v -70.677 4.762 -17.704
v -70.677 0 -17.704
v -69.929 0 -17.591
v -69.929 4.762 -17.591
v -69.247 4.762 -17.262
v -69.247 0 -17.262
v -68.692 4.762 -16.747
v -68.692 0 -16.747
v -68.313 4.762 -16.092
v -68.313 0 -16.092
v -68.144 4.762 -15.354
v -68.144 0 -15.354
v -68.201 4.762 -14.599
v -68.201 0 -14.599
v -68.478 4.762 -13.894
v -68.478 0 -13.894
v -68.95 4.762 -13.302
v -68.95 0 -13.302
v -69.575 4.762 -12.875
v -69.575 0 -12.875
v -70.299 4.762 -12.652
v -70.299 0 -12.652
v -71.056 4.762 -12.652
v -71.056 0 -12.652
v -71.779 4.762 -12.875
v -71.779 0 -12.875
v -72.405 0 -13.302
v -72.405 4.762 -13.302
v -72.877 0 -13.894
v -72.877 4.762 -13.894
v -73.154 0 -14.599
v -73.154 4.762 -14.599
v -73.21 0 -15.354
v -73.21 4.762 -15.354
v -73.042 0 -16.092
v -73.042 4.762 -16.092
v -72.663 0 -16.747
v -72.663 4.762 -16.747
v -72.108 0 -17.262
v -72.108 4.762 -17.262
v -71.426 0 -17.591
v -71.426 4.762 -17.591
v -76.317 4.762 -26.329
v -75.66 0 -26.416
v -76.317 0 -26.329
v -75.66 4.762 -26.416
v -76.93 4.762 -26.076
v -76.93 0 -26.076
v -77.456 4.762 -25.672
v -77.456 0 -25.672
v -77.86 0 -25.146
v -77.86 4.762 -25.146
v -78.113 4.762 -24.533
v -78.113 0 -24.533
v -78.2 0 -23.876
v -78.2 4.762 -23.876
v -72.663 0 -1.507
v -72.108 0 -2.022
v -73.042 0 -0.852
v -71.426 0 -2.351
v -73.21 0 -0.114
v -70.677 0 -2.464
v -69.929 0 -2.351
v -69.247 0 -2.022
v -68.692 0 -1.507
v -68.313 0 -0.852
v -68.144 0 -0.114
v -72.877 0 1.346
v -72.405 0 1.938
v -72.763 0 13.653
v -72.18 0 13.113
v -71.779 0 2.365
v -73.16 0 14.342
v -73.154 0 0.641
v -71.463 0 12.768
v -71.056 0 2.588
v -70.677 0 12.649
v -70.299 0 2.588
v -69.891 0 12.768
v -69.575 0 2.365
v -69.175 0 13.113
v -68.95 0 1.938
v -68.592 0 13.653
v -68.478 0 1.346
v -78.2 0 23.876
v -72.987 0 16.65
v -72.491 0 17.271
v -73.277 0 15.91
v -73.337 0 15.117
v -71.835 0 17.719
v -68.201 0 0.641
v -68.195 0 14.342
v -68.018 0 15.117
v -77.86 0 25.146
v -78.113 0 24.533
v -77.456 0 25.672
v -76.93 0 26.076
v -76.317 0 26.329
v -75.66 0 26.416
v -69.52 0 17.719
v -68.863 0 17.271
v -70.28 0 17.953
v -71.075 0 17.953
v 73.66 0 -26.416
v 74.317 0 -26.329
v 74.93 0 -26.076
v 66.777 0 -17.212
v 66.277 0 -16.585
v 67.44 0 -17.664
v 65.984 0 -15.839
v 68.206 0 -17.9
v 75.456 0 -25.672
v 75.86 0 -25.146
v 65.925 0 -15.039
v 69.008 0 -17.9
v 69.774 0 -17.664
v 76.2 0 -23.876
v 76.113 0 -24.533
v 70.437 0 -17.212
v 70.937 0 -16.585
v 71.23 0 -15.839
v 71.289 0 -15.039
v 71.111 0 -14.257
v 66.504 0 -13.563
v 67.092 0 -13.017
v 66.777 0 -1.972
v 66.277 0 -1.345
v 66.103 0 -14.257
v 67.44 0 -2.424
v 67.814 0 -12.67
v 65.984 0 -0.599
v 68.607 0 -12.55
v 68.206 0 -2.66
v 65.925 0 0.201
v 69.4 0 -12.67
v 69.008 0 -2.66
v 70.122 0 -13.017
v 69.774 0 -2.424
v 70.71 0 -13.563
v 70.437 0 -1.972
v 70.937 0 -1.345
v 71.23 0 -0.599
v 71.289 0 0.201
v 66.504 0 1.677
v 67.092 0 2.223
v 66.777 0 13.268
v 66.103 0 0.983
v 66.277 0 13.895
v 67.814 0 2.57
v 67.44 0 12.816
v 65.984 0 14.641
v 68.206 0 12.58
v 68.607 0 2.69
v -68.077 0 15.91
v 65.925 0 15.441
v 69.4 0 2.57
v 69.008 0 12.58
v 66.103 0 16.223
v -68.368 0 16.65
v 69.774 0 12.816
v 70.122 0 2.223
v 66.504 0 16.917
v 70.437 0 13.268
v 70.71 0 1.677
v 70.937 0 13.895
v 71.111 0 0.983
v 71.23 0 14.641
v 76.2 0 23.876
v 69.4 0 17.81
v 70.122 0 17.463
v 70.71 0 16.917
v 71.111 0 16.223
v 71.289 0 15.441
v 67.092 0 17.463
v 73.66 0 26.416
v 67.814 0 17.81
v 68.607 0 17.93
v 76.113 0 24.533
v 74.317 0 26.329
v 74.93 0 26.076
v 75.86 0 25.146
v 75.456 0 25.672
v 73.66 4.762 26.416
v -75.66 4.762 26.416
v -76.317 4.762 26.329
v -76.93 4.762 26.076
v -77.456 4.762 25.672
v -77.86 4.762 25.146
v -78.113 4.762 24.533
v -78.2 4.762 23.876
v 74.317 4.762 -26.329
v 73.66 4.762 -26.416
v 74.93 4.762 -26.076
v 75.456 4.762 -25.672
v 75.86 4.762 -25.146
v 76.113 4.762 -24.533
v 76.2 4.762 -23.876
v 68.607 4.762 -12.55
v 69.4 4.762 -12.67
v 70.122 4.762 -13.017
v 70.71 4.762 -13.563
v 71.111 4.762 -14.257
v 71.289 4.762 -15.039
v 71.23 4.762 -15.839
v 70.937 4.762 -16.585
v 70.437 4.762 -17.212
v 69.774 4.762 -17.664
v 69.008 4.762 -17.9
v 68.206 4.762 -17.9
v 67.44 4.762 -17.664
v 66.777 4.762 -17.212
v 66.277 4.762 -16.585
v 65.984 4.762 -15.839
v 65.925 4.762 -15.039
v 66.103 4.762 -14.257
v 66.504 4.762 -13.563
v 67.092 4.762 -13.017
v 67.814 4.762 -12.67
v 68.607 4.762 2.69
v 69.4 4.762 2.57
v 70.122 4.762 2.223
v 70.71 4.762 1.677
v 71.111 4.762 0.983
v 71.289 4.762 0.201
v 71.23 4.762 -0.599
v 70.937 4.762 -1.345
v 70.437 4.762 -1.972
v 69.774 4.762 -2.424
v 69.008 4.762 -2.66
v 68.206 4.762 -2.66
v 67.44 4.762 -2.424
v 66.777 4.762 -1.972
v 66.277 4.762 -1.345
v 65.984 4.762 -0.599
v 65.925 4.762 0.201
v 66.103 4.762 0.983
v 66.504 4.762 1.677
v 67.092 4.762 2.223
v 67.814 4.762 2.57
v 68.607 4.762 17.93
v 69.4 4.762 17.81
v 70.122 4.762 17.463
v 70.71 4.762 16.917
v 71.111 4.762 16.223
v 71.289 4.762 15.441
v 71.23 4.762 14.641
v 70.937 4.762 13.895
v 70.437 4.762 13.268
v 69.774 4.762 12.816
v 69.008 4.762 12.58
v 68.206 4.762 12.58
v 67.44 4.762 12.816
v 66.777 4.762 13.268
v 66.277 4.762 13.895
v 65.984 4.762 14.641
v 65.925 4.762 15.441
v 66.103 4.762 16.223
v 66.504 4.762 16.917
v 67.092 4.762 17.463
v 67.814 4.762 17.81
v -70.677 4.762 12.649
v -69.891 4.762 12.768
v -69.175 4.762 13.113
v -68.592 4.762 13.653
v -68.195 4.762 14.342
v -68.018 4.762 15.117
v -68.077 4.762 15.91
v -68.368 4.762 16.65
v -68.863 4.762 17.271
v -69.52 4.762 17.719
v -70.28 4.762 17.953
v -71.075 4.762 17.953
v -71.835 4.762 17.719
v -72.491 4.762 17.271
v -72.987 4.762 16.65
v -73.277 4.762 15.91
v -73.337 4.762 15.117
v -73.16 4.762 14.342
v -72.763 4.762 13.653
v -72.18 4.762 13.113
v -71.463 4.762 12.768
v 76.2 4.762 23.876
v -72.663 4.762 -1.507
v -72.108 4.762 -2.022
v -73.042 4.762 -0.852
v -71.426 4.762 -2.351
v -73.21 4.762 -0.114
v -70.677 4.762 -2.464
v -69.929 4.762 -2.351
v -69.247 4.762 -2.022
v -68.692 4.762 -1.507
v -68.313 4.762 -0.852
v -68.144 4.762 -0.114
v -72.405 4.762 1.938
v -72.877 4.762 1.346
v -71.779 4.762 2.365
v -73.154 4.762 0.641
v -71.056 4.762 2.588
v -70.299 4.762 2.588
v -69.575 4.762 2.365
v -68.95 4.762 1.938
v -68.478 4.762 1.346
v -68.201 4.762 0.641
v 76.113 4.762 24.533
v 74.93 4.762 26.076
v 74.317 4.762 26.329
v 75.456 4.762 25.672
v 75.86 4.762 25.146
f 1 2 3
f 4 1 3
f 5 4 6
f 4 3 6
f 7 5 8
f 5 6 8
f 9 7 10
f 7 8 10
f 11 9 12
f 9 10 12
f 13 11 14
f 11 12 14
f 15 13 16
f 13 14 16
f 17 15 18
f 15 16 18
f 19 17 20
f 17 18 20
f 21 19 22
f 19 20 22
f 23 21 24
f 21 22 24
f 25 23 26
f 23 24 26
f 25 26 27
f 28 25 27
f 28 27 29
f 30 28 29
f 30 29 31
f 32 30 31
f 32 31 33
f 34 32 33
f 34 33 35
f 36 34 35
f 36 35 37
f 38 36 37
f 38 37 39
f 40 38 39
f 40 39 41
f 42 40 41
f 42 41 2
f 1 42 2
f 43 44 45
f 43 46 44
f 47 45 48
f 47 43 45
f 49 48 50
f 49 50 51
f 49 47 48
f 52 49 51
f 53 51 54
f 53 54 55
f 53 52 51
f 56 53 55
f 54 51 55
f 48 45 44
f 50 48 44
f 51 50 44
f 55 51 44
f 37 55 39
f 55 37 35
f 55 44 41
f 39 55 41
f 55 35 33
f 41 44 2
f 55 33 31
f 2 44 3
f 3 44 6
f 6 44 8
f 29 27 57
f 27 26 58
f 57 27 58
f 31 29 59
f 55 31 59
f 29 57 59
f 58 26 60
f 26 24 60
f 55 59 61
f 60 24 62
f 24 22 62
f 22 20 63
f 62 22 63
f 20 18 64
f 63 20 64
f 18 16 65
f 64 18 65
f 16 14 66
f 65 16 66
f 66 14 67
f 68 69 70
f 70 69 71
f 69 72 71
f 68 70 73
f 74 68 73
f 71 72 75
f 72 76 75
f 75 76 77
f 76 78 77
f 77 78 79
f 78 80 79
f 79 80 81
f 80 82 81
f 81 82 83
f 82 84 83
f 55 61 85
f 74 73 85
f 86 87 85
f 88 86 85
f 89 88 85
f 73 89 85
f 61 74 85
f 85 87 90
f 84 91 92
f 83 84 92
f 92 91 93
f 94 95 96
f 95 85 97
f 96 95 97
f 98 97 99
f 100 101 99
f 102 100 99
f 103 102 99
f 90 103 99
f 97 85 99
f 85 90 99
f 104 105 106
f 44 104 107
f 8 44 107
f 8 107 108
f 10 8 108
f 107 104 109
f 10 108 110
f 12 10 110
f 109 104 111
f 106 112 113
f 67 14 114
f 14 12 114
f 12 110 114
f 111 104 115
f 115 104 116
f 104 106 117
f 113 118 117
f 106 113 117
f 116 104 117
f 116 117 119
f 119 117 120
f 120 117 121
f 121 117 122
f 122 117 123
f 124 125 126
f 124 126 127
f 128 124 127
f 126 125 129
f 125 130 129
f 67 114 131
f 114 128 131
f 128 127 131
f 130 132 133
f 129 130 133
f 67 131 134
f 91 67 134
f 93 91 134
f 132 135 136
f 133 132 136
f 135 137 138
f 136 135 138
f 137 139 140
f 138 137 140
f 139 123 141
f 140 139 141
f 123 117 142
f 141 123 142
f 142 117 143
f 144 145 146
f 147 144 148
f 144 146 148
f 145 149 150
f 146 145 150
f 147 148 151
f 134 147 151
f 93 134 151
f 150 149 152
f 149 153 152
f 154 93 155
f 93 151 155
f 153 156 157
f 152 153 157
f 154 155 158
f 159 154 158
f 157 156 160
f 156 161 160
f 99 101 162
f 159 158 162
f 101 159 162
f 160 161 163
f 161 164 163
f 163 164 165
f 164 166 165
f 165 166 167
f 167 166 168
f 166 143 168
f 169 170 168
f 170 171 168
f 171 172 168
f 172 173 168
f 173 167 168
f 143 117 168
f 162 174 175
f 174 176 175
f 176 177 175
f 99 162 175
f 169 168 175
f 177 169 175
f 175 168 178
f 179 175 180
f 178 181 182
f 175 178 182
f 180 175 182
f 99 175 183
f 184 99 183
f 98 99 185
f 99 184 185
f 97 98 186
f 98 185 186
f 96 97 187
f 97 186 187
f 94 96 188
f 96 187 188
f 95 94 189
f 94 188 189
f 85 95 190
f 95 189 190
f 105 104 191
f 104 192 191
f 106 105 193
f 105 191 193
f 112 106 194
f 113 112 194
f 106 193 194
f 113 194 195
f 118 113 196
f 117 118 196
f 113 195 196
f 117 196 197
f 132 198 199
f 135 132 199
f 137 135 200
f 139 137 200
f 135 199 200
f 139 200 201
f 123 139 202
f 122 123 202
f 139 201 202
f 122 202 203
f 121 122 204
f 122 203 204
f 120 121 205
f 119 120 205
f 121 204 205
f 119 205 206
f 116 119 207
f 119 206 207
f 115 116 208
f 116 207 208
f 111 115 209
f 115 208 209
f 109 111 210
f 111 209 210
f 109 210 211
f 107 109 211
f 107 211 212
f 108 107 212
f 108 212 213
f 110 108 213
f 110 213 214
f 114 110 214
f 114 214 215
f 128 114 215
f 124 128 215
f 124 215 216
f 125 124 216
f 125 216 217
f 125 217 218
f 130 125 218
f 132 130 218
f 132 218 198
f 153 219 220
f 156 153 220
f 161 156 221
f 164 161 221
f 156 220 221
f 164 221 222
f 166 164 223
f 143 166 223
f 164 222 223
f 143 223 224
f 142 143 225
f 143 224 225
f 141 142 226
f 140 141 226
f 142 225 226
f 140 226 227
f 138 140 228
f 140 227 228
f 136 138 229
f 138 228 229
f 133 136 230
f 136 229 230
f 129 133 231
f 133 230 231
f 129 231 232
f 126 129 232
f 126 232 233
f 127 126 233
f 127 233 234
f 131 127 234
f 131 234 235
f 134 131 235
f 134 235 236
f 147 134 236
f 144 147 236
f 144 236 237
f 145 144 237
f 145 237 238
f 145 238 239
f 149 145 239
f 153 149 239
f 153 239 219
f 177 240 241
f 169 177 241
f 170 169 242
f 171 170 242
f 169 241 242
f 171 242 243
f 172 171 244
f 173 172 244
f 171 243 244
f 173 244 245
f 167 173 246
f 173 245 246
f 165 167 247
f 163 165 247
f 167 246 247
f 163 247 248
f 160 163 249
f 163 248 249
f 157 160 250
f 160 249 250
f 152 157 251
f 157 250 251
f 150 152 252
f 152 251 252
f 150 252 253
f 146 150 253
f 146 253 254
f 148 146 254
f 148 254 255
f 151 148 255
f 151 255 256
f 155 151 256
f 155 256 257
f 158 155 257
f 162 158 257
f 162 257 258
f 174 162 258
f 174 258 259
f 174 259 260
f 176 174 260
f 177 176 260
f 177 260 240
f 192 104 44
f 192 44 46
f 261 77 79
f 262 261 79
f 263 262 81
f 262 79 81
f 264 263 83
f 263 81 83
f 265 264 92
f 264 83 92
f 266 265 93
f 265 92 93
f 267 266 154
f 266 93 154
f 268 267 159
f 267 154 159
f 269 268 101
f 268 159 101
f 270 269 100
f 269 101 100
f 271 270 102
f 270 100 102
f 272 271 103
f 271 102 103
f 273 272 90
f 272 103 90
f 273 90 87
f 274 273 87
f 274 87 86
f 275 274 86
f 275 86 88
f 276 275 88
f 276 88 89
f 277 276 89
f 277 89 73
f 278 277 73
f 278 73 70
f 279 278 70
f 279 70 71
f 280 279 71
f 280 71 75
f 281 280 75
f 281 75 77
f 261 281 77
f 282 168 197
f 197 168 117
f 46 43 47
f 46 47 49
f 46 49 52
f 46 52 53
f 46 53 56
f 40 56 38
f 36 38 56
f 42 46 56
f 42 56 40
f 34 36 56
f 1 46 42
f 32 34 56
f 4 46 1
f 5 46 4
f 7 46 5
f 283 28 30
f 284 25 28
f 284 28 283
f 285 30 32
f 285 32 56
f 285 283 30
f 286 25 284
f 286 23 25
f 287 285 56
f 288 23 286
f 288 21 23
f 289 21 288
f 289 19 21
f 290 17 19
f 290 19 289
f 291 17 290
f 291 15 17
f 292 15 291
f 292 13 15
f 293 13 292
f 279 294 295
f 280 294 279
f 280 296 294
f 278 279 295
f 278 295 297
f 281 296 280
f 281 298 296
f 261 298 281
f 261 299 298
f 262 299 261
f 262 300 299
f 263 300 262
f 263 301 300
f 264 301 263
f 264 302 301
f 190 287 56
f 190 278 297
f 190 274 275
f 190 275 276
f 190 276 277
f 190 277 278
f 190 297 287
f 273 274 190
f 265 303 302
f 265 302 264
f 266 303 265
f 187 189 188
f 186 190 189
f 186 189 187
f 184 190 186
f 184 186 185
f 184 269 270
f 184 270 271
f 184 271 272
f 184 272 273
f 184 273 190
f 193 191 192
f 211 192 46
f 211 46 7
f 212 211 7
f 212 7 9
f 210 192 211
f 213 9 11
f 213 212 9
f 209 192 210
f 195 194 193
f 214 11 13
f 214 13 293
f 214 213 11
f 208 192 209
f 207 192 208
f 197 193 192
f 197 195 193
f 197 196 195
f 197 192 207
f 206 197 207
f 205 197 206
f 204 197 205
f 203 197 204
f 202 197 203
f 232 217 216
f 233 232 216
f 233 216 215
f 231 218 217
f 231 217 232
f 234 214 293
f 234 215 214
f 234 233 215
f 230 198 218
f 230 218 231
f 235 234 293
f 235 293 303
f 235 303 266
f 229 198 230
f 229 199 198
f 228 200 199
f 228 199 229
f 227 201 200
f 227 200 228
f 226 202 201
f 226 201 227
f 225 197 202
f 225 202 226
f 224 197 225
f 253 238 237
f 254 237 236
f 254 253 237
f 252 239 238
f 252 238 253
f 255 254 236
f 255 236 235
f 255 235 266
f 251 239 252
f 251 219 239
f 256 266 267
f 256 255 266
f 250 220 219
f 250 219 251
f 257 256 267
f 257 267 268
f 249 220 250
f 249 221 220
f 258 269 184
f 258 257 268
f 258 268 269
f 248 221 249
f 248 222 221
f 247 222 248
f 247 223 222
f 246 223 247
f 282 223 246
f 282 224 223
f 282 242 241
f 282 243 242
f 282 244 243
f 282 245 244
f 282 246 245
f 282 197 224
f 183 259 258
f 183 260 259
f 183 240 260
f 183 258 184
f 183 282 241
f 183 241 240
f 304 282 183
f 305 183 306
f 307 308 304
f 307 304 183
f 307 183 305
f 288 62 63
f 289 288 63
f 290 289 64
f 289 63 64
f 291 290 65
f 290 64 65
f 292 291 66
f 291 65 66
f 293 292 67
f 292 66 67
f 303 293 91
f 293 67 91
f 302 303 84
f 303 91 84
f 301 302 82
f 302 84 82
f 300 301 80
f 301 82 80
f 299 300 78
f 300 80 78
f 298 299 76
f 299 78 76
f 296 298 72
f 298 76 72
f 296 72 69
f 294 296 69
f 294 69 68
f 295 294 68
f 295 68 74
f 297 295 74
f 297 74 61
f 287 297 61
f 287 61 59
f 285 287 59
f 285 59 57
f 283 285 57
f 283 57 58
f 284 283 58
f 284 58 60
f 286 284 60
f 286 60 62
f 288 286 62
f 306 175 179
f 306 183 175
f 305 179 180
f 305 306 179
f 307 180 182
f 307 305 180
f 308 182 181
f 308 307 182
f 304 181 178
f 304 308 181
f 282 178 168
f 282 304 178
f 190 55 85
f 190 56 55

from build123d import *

# Parameters (mm, degrees)
SKETCH1_W           = 152.4
SKETCH1_H           = 52.832
BOSS_EXTRUDE1_DEPTH = 4.7625
SKETCH2_R           = 2.69
CUT_EXTRUDE1_DEPTH  = 81.789395729
SKETCH5_R           = 2.667
SKETCH5_R_2         = 2.54
CUT_EXTRUDE2_DEPTH  = 81.789395729
SKETCH6_W           = 52.832
SKETCH6_H           = 4.7625
BOSS_EXTRUDE2_DEPTH = 2
FILLET1_R           = 2.54


with BuildPart() as part:
    # Sketch1 → Boss-Extrude1 (new body)
    with BuildSketch(Plane(origin=(0, 0, 0), x_dir=(1, 0, 0), z_dir=(0, 1, 0))):
        Rectangle(SKETCH1_W, SKETCH1_H)
    extrude(amount=BOSS_EXTRUDE1_DEPTH)

    # Sketch2 → Cut-Extrude1 (cut, through all)
    with BuildSketch(Plane(origin=(0, 4.7625, 0), x_dir=(1, 0, 0), z_dir=(0, 1, 0))):
        with Locations(Location((68.607011479, -15.24, 0), (0, 0, 270))):
            Circle(SKETCH2_R)
        with Locations(Location((68.607011479, 0, 0), (0, 0, 270))):
            Circle(SKETCH2_R)
        with Locations(Location((68.607011479, 15.24, 0), (0, 0, 270))):
            Circle(SKETCH2_R)
    extrude(amount=-CUT_EXTRUDE1_DEPTH, mode=Mode.SUBTRACT)

    # Sketch5 → Cut-Extrude2 (cut, through all)
    with BuildSketch(Plane.XZ):
        with Locations(Location((-70.677366471, 15.3162, 0), (0, 0, 270))):
            Circle(SKETCH5_R)
        with Locations(Location((-70.677366471, 0.0762, 0), (0, 0, 270))):
            Circle(SKETCH5_R_2)
        with Locations(Location((-70.677366471, -15.1638, 0), (0, 0, 270))):
            Circle(SKETCH5_R_2)
    extrude(amount=-CUT_EXTRUDE2_DEPTH, mode=Mode.SUBTRACT)

    # Sketch6 → Boss-Extrude2 (add)
    with BuildSketch(Plane.ZY.offset(76.2)):
        with Locations((0, 2.38125)):
            Rectangle(SKETCH6_W, SKETCH6_H)
    extrude(amount=BOSS_EXTRUDE2_DEPTH)

    # Fillet1
    fillet1_edges = [part.edges().sort_by_distance(p)[0] for p in [
        (-78.2, 2.38125, 26.416),
        (-78.2, 2.38125, -26.416),
        (76.2, 2.38125, 26.416),
        (76.2, 2.38125, -26.416),
    ]]
    fillet(fillet1_edges, radius=FILLET1_R)


solid = part.part
